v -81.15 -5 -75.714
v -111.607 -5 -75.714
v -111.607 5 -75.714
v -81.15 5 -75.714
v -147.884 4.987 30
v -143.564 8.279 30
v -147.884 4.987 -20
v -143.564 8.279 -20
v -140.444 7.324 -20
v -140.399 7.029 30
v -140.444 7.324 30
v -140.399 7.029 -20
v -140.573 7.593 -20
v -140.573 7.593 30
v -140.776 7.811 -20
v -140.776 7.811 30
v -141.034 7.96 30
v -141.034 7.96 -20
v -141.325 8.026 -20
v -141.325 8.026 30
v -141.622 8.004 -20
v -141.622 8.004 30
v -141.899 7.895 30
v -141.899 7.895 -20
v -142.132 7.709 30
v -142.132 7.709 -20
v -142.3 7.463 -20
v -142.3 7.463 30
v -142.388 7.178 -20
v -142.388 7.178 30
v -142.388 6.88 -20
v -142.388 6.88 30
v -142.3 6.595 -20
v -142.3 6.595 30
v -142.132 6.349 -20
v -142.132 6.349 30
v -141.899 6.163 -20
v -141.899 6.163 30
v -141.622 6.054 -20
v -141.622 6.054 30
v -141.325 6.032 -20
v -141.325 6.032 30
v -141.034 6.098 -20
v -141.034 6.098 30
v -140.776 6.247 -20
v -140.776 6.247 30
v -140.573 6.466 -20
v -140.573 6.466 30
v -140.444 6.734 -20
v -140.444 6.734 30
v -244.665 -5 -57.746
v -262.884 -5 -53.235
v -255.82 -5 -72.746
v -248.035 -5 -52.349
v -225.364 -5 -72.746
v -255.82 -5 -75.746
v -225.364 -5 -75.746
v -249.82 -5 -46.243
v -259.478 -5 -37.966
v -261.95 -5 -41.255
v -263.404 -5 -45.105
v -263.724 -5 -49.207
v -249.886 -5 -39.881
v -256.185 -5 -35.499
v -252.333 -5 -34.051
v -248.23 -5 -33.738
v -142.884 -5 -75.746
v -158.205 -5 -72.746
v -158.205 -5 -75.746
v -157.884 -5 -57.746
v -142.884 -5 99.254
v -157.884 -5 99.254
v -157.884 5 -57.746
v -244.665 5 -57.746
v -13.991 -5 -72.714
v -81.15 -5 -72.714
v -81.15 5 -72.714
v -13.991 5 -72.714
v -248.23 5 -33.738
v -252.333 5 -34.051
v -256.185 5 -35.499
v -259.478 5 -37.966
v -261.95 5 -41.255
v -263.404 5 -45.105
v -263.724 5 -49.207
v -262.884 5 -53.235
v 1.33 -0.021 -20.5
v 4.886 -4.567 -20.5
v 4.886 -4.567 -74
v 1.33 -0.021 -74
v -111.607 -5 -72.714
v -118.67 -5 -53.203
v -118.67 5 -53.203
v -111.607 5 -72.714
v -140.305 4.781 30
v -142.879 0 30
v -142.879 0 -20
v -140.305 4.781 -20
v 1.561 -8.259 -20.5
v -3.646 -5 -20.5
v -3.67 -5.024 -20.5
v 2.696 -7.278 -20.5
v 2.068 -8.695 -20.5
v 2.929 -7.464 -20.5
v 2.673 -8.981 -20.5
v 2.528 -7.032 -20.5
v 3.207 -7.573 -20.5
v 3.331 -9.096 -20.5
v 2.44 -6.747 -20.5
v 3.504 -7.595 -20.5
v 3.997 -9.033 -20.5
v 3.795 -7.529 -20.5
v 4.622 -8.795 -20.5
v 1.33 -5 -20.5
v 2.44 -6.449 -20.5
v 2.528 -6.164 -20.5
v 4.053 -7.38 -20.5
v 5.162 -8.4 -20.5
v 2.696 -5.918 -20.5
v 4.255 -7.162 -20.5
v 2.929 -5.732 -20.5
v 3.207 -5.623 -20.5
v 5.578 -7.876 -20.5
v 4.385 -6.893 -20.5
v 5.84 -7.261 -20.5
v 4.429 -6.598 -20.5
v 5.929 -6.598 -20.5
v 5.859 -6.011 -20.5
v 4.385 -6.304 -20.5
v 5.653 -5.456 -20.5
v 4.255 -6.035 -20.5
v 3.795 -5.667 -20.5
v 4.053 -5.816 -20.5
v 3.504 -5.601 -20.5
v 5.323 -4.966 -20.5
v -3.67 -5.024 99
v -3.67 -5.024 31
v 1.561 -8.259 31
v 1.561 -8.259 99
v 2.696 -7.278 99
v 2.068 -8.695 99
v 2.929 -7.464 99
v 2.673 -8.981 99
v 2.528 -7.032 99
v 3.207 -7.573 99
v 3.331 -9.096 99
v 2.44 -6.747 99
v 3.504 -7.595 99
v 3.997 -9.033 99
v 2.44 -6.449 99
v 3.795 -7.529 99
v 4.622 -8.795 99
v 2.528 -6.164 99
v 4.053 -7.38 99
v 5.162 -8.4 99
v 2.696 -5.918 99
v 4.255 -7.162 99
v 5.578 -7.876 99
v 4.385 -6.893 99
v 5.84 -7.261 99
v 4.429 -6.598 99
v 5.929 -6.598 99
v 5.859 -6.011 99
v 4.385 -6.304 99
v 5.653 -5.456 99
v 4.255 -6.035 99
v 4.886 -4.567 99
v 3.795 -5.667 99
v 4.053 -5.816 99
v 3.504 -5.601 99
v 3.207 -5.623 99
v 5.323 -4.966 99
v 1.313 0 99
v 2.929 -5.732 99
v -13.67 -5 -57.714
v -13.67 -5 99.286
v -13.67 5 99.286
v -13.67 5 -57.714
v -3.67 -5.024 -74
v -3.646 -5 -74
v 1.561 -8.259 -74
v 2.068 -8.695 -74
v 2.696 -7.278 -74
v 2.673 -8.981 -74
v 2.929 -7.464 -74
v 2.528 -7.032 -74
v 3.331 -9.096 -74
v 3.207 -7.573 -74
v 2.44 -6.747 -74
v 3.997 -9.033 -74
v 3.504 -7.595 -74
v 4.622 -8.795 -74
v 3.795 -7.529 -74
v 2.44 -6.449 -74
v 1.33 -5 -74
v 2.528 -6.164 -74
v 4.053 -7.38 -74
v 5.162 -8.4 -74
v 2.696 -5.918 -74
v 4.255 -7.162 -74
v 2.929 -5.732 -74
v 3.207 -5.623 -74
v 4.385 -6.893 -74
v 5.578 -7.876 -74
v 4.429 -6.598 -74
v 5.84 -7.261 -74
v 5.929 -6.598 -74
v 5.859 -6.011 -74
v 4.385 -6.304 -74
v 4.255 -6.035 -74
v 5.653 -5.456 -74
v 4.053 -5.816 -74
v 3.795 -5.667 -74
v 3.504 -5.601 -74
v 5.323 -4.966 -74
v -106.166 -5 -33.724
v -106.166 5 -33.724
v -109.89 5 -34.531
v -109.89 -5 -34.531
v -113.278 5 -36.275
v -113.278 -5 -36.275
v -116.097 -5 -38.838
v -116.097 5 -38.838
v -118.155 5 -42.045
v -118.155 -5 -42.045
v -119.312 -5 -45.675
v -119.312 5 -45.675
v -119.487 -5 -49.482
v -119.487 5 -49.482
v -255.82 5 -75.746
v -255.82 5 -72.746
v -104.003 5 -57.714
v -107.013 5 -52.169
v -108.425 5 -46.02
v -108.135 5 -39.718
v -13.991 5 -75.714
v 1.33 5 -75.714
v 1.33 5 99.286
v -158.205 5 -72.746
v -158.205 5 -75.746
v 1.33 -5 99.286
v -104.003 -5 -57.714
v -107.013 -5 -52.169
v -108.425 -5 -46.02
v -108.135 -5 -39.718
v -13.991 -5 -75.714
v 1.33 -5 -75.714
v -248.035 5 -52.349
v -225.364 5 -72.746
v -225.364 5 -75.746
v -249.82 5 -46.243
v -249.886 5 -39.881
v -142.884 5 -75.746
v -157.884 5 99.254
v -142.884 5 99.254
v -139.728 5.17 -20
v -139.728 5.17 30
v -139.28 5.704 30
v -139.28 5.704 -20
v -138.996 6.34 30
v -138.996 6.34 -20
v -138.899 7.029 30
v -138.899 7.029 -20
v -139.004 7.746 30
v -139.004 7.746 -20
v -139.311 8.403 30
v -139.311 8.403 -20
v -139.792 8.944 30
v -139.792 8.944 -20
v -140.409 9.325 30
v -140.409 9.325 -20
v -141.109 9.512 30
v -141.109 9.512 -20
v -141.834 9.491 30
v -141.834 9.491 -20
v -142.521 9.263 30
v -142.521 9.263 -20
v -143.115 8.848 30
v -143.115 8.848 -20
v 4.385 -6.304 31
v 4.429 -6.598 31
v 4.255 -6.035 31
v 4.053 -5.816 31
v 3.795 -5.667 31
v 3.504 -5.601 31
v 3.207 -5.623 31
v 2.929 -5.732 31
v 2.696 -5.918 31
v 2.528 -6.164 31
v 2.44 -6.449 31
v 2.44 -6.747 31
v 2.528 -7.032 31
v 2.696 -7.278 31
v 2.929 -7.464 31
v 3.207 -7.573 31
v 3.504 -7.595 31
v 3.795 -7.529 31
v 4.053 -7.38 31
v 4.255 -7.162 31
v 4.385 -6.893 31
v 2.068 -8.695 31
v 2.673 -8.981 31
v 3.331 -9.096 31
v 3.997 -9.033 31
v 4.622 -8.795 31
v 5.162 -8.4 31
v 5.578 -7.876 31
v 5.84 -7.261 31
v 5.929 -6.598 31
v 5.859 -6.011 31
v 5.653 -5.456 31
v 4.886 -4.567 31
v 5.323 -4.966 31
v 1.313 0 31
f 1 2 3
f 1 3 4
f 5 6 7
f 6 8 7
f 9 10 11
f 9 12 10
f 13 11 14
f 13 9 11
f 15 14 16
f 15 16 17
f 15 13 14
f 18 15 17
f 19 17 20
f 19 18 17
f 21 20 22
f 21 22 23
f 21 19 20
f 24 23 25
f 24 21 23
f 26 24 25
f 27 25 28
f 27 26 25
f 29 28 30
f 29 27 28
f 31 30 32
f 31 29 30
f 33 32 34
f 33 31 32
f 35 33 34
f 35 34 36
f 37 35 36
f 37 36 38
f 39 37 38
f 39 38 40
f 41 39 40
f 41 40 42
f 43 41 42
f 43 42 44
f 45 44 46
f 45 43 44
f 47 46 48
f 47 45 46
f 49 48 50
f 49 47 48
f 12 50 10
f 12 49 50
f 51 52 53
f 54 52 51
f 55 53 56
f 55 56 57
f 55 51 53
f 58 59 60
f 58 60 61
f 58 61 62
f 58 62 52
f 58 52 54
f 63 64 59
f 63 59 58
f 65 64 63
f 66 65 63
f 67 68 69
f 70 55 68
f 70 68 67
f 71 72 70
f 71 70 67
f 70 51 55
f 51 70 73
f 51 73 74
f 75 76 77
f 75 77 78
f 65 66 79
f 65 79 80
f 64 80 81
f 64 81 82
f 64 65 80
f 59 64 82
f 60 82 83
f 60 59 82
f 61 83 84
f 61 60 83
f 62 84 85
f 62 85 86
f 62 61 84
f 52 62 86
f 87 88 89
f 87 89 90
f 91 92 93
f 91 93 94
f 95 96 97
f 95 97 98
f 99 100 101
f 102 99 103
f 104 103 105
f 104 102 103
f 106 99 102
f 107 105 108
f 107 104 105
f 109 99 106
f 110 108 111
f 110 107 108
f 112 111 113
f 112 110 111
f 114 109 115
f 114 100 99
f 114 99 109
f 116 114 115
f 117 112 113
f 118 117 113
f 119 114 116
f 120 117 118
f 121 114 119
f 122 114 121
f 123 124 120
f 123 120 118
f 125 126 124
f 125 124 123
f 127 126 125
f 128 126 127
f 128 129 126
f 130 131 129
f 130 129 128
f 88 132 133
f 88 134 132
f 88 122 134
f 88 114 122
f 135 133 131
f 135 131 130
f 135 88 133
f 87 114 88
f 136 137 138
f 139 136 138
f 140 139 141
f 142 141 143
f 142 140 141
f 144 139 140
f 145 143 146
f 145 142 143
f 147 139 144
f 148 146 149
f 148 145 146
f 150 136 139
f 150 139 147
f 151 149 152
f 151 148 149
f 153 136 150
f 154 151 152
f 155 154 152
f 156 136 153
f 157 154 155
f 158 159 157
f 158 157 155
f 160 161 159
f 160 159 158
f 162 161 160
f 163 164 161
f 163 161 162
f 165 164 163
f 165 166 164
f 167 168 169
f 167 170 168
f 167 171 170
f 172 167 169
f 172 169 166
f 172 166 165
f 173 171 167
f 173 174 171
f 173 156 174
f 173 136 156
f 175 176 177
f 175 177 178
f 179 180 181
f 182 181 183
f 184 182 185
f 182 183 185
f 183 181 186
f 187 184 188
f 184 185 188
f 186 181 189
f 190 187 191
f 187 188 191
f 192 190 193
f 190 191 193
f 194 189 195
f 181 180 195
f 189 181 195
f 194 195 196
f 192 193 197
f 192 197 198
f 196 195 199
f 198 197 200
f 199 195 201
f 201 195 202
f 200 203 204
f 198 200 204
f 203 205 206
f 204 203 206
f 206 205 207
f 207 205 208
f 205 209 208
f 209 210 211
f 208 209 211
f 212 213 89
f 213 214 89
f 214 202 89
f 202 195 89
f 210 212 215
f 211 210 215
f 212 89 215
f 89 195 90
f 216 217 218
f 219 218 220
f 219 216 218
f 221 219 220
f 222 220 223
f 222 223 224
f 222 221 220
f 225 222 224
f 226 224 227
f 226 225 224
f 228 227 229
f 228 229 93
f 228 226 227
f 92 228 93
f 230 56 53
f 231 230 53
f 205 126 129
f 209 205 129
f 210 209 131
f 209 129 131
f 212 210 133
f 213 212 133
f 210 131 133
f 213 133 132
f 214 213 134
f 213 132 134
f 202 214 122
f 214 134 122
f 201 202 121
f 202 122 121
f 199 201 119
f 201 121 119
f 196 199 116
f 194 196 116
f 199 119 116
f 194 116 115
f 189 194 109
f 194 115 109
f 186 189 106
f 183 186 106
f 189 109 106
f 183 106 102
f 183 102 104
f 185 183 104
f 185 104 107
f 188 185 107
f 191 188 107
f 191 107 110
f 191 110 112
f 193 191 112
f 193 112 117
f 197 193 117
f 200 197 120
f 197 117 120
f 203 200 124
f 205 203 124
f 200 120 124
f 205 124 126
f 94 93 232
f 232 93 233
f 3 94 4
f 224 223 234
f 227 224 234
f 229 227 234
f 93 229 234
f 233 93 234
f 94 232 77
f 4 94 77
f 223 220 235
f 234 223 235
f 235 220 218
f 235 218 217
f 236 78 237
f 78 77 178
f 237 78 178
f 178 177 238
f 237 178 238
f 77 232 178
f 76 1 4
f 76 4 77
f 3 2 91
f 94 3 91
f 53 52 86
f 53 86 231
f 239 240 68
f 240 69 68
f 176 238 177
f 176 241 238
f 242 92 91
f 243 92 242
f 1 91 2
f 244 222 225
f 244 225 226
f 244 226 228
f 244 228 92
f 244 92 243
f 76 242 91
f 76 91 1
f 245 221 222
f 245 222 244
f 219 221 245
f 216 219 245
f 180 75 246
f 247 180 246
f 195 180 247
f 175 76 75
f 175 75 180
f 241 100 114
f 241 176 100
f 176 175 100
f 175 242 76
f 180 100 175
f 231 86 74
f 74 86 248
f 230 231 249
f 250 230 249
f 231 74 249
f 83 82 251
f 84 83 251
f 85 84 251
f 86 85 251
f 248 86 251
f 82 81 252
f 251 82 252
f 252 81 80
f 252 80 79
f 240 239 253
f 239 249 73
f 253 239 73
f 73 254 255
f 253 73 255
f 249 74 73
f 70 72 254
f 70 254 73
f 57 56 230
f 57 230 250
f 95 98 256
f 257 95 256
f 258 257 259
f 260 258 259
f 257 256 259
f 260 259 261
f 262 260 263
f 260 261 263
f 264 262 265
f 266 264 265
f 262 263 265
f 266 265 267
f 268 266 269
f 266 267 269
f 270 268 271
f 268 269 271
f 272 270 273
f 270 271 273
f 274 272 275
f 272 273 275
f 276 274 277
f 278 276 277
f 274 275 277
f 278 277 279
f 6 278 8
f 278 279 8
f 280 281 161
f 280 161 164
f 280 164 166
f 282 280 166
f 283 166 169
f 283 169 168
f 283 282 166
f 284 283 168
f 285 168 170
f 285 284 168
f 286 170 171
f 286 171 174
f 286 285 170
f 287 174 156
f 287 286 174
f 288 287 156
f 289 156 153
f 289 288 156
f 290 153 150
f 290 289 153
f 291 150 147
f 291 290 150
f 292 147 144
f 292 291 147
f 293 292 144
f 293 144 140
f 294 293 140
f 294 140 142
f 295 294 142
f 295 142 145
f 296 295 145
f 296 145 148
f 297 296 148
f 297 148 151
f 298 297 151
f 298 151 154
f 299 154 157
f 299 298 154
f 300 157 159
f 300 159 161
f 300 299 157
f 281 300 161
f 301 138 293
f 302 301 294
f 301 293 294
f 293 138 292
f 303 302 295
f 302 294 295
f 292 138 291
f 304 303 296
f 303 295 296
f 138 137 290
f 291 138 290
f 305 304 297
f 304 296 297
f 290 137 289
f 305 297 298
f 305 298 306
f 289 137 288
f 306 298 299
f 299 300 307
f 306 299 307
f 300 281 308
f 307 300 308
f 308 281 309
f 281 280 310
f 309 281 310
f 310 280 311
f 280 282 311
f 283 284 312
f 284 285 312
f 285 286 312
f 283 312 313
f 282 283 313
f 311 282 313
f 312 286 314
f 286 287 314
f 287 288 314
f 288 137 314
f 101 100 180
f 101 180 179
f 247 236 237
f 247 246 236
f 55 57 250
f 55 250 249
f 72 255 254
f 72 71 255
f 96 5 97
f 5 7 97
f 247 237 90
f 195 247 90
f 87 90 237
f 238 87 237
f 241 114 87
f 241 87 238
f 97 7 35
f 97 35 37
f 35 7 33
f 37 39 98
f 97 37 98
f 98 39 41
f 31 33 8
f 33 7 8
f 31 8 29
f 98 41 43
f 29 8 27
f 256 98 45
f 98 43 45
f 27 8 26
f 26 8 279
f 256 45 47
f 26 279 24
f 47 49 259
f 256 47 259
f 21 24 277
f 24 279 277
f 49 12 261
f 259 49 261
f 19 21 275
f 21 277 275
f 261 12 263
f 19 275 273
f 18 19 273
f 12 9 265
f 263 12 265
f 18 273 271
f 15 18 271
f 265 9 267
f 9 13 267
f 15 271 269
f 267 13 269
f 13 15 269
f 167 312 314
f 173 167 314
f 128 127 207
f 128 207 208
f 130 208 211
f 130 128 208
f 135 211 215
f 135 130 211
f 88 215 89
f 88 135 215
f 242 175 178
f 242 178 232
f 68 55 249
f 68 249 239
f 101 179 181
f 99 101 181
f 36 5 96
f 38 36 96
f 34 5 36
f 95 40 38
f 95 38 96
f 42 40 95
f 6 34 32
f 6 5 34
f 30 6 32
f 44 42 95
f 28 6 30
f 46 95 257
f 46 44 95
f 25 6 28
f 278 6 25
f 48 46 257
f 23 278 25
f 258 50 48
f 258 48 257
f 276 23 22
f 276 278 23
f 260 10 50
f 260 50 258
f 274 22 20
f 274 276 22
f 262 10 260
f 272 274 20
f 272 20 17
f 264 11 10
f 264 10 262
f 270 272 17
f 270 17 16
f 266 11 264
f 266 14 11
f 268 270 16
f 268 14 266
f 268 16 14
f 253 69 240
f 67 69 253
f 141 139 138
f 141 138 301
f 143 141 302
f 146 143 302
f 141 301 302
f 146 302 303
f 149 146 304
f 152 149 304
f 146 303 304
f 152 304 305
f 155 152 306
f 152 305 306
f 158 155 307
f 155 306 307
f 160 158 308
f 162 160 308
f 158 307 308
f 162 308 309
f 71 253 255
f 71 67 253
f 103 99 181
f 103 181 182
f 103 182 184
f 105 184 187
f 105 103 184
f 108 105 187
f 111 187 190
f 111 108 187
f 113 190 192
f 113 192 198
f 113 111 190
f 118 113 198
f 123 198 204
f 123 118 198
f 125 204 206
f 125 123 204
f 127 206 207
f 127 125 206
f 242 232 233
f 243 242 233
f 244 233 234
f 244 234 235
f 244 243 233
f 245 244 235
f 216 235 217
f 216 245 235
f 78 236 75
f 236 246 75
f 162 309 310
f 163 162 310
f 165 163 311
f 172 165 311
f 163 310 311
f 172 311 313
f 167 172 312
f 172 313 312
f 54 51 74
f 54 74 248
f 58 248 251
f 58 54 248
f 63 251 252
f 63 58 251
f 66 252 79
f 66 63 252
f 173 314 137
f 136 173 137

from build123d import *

# Parameters (mm, degrees)
F0_W          = 15.321185604
F0_H          = 3
F0_W_2        = 30.4560337395
F1_DEPTH      = 5
F2_R          = 1
F3_DEPTH      = 20
F3_DEPTH_BACK = 30
F4_START      = -20.5
F4_DEPTH      = 53.5
F5_START      = 31
F5_DEPTH      = 68


# Not quite as in the source:
# - a feature names something its author has since deleted; it is built from what else it names


with BuildPart() as f1:
    # F0 (on Front) → F1 (new body, symmetric)
    with BuildSketch(Plane.XZ):
        with BuildLine():
            Line((-142.8835457128, 99.2541786495), (-157.8835457128, 99.2541786495))
            Line((-157.8835457128, 99.2541786495), (-157.8835457128, -57.7458213505))
            Line((-157.8835457128, -57.7458213505), (-244.6652154244, -57.7458213505))
            ThreePointArc((-244.6652154244, -57.7458213505), (-249.819751502, -46.2428496856), (-248.2298080079, -33.7384632959))
            ThreePointArc((-248.2298080079, -33.7384632959), (-260.8309353496, -39.5226598893), (-262.8835457128, -53.2351407447))
            Line((-262.8835457128, -53.2351407447), (-255.8200499165, -72.7458213505))
            Line((-255.8200499165, -72.7458213505), (-225.3640161769, -72.7458213505))
            Line((-225.3640161769, -72.7458213505), (-158.2047313168, -72.7458213505))
            Line((-158.2047313168, -72.7458213505), (-142.8835457128, -72.7458213505))
            Line((-142.8835457128, -72.7458213505), (-142.8835457128, 99.2541786495))
        make_face()
        with Locations((-150.5441385148, -74.2458213505)):
            Rectangle(F0_W, F0_H)
        with Locations((-240.5920330467, -74.2458213505)):
            Rectangle(F0_W_2, F0_H)
    extrude(amount=F1_DEPTH, both=True)


with BuildPart() as f1b:
    # F0 (on Front) → F1, piece 2 (new body, symmetric)
    with BuildSketch(Plane.XZ):
        with BuildLine():
            Line((1.3299961225, 99.2861494968), (-13.6700038775, 99.2861494968))
            Line((-13.6700038775, 99.2861494968), (-13.6700038775, -57.7138505032))
            Line((-13.6700038775, -57.7138505032), (-104.0030368801, -57.7138505032))
            ThreePointArc((-104.0030368801, -57.7138505032), (-108.4245444734, -46.0201943036), (-106.1661484389, -33.7242204885))
            ThreePointArc((-106.1661484389, -33.7242204885), (-117.2315141427, -40.373870816), (-118.6700038775, -53.2031698974))
            Line((-118.6700038775, -53.2031698974), (-111.6065080813, -72.7138505032))
            Line((-111.6065080813, -72.7138505032), (-81.1504743417, -72.7138505032))
            Line((-81.1504743417, -72.7138505032), (-13.9911894815, -72.7138505032))
            Line((-13.9911894815, -72.7138505032), (1.3299961225, -72.7138505032))
            Line((1.3299961225, -72.7138505032), (1.3299961225, -2.6822620718))
            Line((1.3299961225, -2.6822620718), (1.3299961225, 31.9242632935))
            Line((1.3299961225, 31.9242632935), (1.3299961225, 99.2861494968))
        make_face()
        with Locations((-96.3784912115, -74.2138505032)):
            Rectangle(F0_W_2, F0_H)
        with Locations((-6.3305966795, -74.2138505032)):
            Rectangle(F0_W, F0_H)
    extrude(amount=F1_DEPTH, both=True)

    # F2 (on Top) → F4 (join)
    with BuildSketch(Plane.XY.offset(F4_START)):
        with BuildLine():
            ThreePointArc((1.5607074298, -8.2591902465), (4.3176765393, -8.9350586961), (5.9292119056, -6.598259476))
            ThreePointArc((5.9292119056, -6.598259476), (5.6531681475, -5.4563231231), (4.8859969983, -4.5665662921))
            ThreePointArc((4.8859969983, -4.5665662921), (1.5941978234, -4.9004010255), (1.5165762661, -8.2081740423))
            ThreePointArc((1.5165762661, -8.2081740423), (1.5384697746, -8.2338309951), (1.5607074298, -8.2591902465))
        make_face()
        with Locations((3.4292119056, -6.598259476)):
            Circle(F2_R, mode=Mode.SUBTRACT)
        with BuildLine():
            ThreePointArc((1.5165762661, -8.2081740423), (1.5941978234, -4.9004010255), (4.8859969983, -4.5665662921))
            Line((4.8859969983, -4.5665662921), (1.3131950982, 0))
            Line((1.3131950982, 0), (-3.6700038775, -5.0244089216))
            Line((-3.6700038775, -5.0244089216), (1.5165762661, -8.2081740423))
        make_face()
        with BuildLine():
            Line((-3.6700038775, -5.0244089216), (1.5607074298, -8.2591902465))
            ThreePointArc((1.5607074298, -8.2591902465), (1.5384697746, -8.2338309951), (1.5165762661, -8.2081740423))
            Line((1.5165762661, -8.2081740423), (-3.6700038775, -5.0244089216))
        make_face()
    extrude(amount=-F4_DEPTH)


with BuildPart() as f3:
    # F2 (on Top) → F3 (new body, two sides)
    with BuildSketch(Plane.XY) as f3_sk:
        with BuildLine():
            ThreePointArc((-140.3050830614, 4.7814064547), (-139.2797249014, 5.7036192761), (-138.8993577326, 7.0291971353))
            ThreePointArc((-138.8993577326, 7.0291971353), (-140.7523801028, 9.4440304518), (-143.5644936898, 8.2790716438))
            ThreePointArc((-143.5644936898, 8.2790716438), (-143.228319574, 5.3248208322), (-140.3050830614, 4.7814064547))
        make_face()
        with Locations((-141.3993577326, 7.0291971353)):
            Circle(F2_R, mode=Mode.SUBTRACT)
        with BuildLine():
            ThreePointArc((-140.3050830614, 4.7814064547), (-143.228319574, 5.3248208322), (-143.5644936898, 8.2790716438))
            Line((-143.5644936898, 8.2790716438), (-147.8835457128, 4.9874218958))
            Line((-147.8835457128, 4.9874218958), (-142.8794413805, 0))
            Line((-142.8794413805, 0), (-140.3050830614, 4.7814064547))
        make_face()
    extrude(amount=-F3_DEPTH)
    extrude(f3_sk.sketch, amount=F3_DEPTH_BACK)


with BuildPart() as f5:
    # F2 (on Top) → F5 (new body)
    with BuildSketch(Plane.XY.offset(F5_START)):
        with BuildLine():
            ThreePointArc((1.5607074298, -8.2591902465), (4.3176765393, -8.9350586961), (5.9292119056, -6.598259476))
            ThreePointArc((5.9292119056, -6.598259476), (5.6531681475, -5.4563231231), (4.8859969983, -4.5665662921))
            ThreePointArc((4.8859969983, -4.5665662921), (1.5941978234, -4.9004010255), (1.5165762661, -8.2081740423))
            ThreePointArc((1.5165762661, -8.2081740423), (1.5384697746, -8.2338309951), (1.5607074298, -8.2591902465))
        make_face()
        with Locations((3.4292119056, -6.598259476)):
            Circle(F2_R, mode=Mode.SUBTRACT)
        with BuildLine():
            ThreePointArc((1.5165762661, -8.2081740423), (1.5941978234, -4.9004010255), (4.8859969983, -4.5665662921))
            Line((4.8859969983, -4.5665662921), (1.3131950982, 0))
            Line((1.3131950982, 0), (-3.6700038775, -5.0244089216))
            Line((-3.6700038775, -5.0244089216), (1.5165762661, -8.2081740423))
        make_face()
        with BuildLine():
            Line((-3.6700038775, -5.0244089216), (1.5607074298, -8.2591902465))
            ThreePointArc((1.5607074298, -8.2591902465), (1.5384697746, -8.2338309951), (1.5165762661, -8.2081740423))
            Line((1.5165762661, -8.2081740423), (-3.6700038775, -5.0244089216))
        make_face()
    extrude(amount=F5_DEPTH)


solid = Compound([f1.part, f1b.part, f3.part, f5.part])
